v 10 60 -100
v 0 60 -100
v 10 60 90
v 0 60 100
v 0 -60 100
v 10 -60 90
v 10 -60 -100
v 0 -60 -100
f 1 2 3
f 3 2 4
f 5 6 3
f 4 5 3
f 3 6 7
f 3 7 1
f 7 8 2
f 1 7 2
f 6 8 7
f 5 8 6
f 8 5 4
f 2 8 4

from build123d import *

# Parameters (mm, degrees)
F0_W     = 120
F0_H     = 200
F1_DEPTH = 10
F2_SIZE  = 9.99999


# Not quite as in the source:
# - a fillet or chamfer is up to 0.001 mm smaller than in the source, because OpenCascade refuses the exact size


with BuildPart() as f1:
    # F0 (on Right) → F1 (new body)
    with BuildSketch(Plane.YZ):
        Rectangle(F0_W, F0_H)
    extrude(amount=F1_DEPTH)

    # F2 (size 10 in the source; OpenCascade refuses exactly that, so slightly less here)
    f2_edges = [f1.edges().sort_by_distance(p)[0] for p in [
        (10, 0, 100),
    ]]
    chamfer(f2_edges, length=F2_SIZE)


solid = f1.part
